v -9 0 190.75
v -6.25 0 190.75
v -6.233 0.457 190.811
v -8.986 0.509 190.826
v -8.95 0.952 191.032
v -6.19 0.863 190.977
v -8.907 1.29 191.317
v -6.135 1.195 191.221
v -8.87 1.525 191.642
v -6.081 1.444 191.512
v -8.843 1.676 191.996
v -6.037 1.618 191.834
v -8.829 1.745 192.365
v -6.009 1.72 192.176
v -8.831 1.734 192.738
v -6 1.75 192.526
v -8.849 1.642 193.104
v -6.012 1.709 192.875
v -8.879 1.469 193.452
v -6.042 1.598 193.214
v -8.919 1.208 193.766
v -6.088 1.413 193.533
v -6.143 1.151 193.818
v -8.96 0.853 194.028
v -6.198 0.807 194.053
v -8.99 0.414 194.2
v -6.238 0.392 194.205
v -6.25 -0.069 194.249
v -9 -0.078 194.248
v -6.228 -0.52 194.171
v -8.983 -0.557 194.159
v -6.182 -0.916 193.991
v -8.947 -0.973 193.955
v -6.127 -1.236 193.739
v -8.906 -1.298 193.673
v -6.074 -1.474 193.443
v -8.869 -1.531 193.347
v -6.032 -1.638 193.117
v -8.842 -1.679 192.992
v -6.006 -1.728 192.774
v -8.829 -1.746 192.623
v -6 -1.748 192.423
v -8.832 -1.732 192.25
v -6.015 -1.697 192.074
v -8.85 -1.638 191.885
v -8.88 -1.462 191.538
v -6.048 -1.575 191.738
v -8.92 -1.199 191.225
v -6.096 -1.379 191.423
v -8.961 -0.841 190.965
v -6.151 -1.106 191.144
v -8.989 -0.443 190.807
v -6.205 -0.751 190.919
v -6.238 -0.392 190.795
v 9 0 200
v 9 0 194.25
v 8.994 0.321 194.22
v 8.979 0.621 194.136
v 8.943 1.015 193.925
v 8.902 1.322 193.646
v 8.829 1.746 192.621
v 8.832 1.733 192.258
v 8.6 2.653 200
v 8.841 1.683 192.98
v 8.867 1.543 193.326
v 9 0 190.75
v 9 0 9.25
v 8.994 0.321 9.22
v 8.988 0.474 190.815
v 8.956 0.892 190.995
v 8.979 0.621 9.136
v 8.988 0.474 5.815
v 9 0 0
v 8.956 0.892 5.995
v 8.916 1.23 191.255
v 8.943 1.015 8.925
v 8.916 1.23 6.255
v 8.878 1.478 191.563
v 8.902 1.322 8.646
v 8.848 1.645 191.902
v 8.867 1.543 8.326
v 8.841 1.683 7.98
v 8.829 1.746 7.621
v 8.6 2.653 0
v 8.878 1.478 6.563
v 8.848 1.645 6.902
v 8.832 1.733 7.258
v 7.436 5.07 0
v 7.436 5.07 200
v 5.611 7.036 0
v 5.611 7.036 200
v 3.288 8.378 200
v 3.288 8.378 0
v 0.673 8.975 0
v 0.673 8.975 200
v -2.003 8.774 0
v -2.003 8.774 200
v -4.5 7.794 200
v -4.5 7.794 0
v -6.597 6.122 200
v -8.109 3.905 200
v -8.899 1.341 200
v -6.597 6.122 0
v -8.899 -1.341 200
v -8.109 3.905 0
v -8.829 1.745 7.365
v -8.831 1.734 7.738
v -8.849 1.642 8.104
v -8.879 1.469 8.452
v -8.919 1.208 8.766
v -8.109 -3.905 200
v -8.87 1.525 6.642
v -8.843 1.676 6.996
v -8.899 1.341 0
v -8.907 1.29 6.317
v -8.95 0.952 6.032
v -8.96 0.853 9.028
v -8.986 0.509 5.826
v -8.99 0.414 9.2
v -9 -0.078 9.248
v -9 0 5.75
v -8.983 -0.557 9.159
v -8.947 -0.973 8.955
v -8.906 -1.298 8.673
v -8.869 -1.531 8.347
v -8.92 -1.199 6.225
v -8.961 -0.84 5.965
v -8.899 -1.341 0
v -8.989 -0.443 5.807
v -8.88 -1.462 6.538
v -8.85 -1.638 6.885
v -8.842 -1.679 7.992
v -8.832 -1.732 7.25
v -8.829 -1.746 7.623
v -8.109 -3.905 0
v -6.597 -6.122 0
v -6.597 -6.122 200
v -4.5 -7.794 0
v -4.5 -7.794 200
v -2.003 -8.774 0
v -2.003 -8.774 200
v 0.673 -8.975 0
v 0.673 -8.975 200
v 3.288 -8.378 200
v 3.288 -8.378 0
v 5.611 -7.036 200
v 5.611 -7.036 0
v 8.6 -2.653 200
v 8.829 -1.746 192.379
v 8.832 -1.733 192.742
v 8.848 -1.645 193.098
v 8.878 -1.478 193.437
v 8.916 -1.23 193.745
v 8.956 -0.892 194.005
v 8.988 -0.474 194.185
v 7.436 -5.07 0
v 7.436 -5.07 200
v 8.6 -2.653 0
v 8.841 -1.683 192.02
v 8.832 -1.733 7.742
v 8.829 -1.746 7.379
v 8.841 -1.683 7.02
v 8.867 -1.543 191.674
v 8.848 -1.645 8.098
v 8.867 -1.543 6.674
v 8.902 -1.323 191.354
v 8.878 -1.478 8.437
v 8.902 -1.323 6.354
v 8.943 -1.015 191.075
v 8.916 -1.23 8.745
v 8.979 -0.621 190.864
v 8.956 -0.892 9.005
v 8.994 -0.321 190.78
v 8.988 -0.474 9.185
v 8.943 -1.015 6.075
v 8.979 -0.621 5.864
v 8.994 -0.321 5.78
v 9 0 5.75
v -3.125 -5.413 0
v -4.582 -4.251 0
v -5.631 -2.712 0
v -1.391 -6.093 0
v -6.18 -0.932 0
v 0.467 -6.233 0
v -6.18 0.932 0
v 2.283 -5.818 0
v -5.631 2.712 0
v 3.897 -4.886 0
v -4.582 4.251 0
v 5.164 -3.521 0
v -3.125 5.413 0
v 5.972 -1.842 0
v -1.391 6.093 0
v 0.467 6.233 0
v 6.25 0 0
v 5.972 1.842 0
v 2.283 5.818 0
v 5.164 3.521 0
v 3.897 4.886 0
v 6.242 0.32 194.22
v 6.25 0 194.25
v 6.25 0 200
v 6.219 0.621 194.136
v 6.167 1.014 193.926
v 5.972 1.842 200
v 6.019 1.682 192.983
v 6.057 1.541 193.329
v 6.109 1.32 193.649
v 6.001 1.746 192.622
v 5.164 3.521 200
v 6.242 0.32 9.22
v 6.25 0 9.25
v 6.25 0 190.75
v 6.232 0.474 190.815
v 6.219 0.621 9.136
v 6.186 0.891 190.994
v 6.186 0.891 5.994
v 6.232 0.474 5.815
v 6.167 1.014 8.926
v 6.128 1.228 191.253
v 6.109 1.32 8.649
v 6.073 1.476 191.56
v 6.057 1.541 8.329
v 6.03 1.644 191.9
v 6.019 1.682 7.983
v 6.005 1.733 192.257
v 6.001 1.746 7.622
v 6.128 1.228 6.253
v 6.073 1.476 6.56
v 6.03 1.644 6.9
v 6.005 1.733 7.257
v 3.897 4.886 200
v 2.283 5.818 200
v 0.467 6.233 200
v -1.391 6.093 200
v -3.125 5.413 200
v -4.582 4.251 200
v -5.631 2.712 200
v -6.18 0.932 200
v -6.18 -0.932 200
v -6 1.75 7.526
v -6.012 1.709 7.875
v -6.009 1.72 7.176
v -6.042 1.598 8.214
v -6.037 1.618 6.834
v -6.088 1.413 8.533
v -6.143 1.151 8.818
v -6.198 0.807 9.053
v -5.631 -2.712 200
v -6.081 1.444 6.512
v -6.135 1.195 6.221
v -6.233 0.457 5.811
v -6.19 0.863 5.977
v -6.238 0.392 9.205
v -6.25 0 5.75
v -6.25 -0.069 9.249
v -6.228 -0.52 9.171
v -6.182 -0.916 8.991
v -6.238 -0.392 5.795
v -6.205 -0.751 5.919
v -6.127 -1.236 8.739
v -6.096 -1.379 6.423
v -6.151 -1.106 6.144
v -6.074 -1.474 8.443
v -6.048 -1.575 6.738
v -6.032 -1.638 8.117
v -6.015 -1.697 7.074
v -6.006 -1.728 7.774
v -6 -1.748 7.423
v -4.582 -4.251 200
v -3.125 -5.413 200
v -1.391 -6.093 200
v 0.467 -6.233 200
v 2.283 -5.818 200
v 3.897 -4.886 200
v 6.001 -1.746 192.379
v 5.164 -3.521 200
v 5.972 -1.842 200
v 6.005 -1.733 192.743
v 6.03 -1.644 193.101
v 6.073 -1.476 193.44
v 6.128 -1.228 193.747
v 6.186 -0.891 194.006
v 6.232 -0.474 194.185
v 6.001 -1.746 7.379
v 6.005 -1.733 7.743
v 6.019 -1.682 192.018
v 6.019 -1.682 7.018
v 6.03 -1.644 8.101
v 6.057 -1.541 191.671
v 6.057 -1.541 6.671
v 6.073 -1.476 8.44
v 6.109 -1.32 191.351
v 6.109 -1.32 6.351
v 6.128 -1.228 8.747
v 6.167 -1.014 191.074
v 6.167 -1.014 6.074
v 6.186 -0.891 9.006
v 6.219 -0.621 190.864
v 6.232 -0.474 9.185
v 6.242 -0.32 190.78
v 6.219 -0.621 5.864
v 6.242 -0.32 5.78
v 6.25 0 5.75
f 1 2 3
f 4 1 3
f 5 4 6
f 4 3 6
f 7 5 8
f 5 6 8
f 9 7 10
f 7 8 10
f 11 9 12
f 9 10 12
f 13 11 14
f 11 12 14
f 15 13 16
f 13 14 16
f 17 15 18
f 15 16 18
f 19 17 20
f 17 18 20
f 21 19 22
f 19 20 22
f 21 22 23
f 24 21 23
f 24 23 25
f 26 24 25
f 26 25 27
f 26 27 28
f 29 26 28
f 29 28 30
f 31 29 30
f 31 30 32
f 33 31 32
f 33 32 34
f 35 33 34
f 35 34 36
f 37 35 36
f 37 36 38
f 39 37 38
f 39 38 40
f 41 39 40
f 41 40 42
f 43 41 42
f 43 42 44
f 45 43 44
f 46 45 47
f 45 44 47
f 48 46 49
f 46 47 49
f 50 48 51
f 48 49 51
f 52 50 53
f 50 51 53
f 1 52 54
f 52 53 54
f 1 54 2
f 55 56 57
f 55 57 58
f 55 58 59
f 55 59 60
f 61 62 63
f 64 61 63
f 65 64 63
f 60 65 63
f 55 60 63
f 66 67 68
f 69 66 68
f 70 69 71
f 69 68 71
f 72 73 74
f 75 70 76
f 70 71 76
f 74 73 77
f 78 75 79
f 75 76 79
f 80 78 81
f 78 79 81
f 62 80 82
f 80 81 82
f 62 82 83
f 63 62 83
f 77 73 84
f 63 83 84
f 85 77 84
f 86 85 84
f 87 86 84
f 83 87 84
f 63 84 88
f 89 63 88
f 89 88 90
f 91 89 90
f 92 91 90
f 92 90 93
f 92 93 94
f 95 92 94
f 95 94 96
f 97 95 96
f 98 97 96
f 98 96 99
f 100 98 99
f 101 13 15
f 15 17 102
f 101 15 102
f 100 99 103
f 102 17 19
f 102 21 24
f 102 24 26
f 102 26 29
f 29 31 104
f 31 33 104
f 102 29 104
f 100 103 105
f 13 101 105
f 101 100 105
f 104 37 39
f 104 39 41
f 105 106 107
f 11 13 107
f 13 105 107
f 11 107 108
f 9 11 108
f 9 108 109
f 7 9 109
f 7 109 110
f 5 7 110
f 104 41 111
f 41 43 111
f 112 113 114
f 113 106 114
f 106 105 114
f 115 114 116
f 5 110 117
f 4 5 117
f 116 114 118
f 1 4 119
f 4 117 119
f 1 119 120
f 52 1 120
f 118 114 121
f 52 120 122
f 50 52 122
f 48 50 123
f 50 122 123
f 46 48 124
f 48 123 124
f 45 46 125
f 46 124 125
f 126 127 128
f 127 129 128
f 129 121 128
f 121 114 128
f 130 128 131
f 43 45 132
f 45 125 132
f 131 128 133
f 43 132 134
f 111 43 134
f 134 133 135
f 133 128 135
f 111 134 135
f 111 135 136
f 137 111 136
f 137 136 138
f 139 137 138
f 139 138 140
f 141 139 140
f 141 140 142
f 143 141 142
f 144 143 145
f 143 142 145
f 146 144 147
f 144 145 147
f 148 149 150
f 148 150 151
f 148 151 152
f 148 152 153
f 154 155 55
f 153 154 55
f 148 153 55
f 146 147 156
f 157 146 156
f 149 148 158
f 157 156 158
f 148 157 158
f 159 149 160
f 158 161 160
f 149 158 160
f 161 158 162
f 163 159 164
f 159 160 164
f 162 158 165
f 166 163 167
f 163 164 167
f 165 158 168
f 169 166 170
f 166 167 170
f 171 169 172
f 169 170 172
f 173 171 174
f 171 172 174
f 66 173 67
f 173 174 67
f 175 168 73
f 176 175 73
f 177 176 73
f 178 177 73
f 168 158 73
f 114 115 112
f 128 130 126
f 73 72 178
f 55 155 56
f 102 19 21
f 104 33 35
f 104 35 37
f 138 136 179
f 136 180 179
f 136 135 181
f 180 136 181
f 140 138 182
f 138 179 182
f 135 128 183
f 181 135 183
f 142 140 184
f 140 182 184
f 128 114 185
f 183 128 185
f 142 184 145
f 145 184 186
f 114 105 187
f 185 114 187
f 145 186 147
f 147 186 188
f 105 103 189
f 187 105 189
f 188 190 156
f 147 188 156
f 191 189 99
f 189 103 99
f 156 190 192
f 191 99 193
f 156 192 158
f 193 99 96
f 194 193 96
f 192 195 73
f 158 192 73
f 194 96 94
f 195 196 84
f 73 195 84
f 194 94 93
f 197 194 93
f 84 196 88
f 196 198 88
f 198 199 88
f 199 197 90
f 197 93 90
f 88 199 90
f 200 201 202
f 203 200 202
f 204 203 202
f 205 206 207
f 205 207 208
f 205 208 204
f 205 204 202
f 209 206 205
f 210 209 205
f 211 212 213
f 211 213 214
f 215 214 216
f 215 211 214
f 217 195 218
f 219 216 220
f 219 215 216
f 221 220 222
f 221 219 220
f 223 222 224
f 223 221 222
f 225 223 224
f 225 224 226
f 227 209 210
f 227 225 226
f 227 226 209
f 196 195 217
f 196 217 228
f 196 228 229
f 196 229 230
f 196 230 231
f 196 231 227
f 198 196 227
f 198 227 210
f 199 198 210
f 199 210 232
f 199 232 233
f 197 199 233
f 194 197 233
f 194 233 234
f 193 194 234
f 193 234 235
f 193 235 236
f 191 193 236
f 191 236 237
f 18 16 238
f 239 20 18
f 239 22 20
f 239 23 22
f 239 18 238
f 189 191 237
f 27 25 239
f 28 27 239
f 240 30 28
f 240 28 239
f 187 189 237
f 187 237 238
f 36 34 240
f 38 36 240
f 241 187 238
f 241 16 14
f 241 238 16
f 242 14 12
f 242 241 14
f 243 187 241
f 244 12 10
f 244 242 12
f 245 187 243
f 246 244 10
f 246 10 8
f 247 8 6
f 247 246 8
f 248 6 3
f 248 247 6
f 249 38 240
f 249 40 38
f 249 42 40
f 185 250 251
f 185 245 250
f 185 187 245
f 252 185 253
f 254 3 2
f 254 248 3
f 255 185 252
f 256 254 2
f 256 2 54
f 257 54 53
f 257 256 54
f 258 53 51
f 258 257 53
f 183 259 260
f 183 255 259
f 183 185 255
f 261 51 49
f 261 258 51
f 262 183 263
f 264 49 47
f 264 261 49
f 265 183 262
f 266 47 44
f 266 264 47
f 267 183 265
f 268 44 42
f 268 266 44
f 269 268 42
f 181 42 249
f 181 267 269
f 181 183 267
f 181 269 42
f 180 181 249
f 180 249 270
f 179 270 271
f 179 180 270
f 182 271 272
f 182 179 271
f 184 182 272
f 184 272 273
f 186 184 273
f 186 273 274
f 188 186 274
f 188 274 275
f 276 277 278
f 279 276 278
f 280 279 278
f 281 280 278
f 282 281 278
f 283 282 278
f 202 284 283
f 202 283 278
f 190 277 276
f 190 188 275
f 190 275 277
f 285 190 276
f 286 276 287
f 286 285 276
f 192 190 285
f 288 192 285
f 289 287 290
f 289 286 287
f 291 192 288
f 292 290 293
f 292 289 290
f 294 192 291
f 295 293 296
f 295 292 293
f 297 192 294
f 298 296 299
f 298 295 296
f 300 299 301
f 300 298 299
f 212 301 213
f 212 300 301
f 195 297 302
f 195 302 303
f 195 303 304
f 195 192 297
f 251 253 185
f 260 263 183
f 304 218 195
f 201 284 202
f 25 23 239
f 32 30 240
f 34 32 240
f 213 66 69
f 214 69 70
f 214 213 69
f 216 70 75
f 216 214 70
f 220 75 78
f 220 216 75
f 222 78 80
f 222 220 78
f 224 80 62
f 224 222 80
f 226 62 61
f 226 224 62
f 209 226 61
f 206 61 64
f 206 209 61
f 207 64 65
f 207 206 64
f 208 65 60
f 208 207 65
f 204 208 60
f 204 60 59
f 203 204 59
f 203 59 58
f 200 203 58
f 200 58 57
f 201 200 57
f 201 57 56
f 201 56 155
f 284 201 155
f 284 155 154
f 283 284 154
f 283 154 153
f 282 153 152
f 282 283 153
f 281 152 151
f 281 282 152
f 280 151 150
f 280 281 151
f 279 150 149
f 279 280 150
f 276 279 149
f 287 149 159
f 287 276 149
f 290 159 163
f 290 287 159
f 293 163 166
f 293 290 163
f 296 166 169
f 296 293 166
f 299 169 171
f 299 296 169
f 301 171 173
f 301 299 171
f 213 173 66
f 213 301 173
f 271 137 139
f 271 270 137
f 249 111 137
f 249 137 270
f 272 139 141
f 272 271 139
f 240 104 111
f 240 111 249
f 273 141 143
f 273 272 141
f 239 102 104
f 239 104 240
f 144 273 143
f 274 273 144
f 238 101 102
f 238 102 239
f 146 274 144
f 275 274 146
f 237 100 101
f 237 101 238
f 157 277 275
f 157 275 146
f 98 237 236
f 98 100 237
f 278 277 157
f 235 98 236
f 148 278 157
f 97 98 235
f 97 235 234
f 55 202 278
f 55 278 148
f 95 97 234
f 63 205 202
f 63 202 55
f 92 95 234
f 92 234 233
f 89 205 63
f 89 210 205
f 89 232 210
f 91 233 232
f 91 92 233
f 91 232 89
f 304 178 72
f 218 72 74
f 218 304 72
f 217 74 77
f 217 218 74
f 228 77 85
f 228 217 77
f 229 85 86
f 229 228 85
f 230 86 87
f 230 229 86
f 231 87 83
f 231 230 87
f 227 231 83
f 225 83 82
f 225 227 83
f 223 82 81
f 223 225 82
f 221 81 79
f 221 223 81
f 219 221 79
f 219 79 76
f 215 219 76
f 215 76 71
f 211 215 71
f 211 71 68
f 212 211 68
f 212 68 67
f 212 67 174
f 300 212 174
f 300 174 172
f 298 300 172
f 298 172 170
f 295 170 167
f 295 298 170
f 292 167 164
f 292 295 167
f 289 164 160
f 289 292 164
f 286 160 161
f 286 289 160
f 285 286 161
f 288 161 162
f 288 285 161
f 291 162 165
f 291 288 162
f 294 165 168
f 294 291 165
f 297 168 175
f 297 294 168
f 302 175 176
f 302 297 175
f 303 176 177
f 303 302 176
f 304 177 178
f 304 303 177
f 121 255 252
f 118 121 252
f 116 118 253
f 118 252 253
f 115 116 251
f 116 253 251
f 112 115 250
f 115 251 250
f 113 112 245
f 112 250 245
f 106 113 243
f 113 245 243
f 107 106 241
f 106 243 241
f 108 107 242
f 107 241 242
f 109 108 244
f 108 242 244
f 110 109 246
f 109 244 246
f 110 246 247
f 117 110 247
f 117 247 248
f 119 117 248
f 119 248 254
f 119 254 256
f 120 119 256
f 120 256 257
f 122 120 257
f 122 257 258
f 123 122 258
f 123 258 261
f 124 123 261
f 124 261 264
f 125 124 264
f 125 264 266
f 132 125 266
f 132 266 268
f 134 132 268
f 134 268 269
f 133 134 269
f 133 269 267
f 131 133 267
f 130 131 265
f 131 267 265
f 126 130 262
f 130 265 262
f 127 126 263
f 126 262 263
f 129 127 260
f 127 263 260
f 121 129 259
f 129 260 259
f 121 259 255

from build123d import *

# Parameters (mm, degrees)
SKETCH_1_R               = 9
SKETCH_1_R_2             = 6.25
EXTRUDE_1_DEPTH          = 200
SKETCH_2_R               = 1.75
CUT_EXTRUDE_1_DEPTH      = 10
CUT_EXTRUDE_1_DEPTH_BACK = 10


with BuildPart() as part:
    # ｽｹｯﾁ1 → ﾎﾞｽ - 押し出し1 (new body)
    with BuildSketch(Plane.XY):
        Circle(SKETCH_1_R)
        Circle(SKETCH_1_R_2, mode=Mode.SUBTRACT)
    extrude(amount=EXTRUDE_1_DEPTH)

    # ｽｹｯﾁ2 → ｶｯﾄ - 押し出し1 (cut, two sides)
    with BuildSketch(Plane(origin=(0, 0, 0), x_dir=(0, 0, -1), z_dir=(1, 0, 0))) as cut_extrude_1_sk:
        with Locations((-7.5, 0)):
            Circle(SKETCH_2_R)
        with Locations((-192.5, 0)):
            Circle(SKETCH_2_R)
    extrude(amount=CUT_EXTRUDE_1_DEPTH, mode=Mode.SUBTRACT)
    extrude(cut_extrude_1_sk.sketch, amount=-CUT_EXTRUDE_1_DEPTH_BACK, mode=Mode.SUBTRACT)


solid = part.part
